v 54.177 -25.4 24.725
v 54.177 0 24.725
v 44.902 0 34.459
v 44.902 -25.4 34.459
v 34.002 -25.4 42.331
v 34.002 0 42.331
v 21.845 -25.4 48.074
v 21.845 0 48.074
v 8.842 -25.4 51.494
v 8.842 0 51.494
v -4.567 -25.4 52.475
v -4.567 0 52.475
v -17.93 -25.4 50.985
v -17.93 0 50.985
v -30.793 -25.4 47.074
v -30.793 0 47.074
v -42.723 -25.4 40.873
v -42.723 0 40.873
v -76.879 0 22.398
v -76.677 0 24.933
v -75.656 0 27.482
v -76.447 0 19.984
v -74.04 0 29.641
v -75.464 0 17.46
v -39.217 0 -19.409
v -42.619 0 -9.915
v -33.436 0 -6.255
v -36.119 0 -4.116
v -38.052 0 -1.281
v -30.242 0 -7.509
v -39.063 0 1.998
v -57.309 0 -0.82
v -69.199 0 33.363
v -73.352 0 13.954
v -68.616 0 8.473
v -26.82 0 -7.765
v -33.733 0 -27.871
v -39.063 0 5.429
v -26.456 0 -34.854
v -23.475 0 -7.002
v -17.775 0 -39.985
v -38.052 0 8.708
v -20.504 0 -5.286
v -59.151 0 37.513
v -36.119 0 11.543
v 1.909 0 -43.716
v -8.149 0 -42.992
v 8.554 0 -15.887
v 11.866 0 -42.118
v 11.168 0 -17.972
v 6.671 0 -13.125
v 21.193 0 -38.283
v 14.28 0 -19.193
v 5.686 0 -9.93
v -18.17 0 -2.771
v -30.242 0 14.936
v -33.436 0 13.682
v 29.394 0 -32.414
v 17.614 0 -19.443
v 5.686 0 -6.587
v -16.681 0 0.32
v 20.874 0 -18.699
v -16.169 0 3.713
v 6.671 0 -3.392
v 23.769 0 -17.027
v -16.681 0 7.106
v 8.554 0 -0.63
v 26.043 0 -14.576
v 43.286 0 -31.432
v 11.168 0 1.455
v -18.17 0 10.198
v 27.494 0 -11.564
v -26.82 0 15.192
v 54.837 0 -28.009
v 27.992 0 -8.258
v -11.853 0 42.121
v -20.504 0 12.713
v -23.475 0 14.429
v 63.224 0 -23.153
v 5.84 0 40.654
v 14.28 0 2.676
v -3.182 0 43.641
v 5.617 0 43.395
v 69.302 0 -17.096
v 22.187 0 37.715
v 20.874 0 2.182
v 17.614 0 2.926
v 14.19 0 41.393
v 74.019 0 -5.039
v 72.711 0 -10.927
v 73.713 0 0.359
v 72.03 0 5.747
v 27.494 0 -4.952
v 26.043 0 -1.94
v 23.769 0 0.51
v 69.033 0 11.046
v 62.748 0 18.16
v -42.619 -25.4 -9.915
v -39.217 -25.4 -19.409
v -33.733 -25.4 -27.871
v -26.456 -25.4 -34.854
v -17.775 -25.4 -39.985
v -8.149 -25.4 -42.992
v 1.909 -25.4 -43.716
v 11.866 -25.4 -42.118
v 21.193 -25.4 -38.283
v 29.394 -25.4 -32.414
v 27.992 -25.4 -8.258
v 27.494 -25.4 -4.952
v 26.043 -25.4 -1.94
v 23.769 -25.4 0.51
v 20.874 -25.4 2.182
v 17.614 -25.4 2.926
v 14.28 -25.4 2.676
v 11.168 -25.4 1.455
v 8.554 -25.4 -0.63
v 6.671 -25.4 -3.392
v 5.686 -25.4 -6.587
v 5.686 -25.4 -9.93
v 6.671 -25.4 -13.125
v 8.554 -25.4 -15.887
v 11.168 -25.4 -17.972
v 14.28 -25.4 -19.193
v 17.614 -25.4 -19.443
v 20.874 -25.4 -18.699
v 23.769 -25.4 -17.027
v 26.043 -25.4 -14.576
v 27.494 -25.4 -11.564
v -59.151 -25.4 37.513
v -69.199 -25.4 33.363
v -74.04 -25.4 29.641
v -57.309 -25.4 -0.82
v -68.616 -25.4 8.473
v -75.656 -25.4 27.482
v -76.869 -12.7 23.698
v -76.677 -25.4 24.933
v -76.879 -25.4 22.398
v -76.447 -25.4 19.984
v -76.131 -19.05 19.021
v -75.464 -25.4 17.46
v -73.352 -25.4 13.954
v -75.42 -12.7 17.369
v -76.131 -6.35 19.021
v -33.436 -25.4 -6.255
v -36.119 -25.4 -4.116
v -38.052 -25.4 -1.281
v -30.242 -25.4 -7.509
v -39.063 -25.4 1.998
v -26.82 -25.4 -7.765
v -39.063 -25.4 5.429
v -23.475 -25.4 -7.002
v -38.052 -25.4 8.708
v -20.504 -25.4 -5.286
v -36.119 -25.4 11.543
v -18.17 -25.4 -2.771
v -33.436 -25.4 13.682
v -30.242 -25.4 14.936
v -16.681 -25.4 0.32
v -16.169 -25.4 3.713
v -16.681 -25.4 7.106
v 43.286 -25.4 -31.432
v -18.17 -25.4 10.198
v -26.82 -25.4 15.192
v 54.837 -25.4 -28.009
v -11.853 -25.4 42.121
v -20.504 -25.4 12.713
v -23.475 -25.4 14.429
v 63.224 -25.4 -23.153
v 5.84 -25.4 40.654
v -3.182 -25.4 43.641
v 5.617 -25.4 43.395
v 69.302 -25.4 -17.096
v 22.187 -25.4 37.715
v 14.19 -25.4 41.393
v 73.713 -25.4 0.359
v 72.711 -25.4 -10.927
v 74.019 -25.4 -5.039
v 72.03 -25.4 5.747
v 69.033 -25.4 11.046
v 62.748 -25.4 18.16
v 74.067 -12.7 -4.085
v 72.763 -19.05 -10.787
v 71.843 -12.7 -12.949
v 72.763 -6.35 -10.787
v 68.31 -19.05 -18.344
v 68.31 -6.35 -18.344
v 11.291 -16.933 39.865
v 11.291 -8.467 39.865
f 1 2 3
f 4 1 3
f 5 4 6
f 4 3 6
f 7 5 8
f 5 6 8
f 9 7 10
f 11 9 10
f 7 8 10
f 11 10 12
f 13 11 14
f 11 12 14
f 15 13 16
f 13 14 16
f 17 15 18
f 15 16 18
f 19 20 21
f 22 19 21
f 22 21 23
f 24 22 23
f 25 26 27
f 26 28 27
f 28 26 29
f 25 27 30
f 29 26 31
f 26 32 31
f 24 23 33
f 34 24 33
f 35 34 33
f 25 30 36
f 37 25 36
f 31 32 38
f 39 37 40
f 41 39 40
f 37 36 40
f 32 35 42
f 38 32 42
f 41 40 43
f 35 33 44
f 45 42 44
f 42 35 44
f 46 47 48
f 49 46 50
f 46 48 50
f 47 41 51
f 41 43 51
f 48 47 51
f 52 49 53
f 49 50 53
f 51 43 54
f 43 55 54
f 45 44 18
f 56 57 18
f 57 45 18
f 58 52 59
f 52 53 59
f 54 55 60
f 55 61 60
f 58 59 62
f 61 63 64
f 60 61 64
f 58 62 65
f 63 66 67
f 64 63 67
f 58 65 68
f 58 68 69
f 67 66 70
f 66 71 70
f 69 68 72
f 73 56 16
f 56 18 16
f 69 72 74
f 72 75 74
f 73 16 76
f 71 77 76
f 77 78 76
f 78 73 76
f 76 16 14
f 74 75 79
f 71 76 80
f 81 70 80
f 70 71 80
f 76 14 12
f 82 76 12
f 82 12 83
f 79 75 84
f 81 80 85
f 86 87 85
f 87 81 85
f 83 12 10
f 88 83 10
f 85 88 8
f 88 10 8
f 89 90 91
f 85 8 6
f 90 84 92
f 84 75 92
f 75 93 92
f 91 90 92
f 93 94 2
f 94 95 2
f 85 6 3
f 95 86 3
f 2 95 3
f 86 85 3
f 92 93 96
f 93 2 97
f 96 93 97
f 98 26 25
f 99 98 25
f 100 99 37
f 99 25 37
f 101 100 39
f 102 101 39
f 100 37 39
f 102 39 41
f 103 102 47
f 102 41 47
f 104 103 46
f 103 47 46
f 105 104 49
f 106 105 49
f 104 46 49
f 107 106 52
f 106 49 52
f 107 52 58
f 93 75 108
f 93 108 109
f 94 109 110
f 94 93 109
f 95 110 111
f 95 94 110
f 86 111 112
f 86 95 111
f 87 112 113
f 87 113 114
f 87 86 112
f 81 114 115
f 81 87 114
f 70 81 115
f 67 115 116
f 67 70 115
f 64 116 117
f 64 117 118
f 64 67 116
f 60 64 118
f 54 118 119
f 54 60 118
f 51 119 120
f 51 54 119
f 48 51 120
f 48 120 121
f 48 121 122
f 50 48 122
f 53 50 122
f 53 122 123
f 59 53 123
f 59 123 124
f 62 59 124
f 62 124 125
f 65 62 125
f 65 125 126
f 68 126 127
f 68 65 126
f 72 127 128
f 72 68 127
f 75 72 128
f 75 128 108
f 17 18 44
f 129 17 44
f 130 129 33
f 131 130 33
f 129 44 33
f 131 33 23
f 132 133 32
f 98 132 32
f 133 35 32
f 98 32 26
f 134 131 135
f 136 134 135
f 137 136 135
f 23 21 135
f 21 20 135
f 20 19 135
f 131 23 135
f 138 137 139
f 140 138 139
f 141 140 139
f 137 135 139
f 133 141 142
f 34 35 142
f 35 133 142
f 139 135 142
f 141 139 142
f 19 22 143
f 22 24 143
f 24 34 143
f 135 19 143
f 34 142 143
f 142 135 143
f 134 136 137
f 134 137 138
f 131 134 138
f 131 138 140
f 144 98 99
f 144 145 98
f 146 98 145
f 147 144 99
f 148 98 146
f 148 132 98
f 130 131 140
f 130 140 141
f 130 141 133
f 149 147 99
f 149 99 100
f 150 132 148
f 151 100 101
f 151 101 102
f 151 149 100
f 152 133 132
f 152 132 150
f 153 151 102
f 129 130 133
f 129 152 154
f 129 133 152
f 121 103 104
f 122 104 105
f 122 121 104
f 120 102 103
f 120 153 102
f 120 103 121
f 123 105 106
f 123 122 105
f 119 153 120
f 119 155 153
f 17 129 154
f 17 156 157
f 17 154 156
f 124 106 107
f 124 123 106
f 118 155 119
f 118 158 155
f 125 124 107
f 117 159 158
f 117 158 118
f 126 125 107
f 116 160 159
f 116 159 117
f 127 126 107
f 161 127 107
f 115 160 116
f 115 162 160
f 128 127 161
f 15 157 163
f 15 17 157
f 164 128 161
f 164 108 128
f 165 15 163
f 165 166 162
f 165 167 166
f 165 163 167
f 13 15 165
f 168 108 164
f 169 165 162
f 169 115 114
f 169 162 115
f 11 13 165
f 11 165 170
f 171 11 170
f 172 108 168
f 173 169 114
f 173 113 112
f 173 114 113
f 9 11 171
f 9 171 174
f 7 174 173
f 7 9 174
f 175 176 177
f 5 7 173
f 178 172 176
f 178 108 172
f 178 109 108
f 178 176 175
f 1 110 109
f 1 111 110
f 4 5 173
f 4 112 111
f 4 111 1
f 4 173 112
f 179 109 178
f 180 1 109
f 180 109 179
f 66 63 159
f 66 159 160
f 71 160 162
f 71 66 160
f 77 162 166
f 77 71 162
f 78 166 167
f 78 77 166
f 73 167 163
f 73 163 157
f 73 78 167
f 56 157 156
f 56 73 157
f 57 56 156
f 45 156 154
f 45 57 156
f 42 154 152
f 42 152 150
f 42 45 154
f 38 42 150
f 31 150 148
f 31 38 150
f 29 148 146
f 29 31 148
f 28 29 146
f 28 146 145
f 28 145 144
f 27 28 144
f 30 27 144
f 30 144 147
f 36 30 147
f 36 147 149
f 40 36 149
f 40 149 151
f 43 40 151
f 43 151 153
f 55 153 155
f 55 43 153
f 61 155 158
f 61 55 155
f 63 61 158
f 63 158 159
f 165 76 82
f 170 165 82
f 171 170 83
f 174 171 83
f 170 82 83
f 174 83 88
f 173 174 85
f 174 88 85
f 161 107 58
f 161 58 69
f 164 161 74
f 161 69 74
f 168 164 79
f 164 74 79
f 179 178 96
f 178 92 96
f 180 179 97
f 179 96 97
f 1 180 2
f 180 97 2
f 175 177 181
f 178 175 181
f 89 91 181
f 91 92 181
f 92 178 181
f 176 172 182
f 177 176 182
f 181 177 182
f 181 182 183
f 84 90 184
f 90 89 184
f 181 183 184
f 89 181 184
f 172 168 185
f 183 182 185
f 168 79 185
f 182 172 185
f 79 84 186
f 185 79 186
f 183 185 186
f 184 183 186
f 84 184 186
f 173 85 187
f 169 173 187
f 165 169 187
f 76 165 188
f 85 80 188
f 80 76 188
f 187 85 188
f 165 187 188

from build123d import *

# Parameters (mm, degrees)
F0_R     = 11.5110265847
F0_R_2   = 11.2157876958
F1_DEPTH = 25.4
F2_DEPTH = 25.4


with BuildPart() as f1:
    # F0 (on Front) → F1 (new body)
    with BuildSketch(Plane.XZ):
        with BuildLine():
            add(Edge.make_bspline(
                [(-42.6191106401, -9.9153485832), (-20.6350689987, -21.9972569119), (7.738026744, -31.8239785263), (29.3943516136, -32.4141145567)],
                knots=[0.8430854965, 0.8430854965, 0.8430854965, 0.8430854965, 1, 1, 1, 1], degree=3))
            ThreePointArc((29.3943516136, -32.4141145567), (40.0057537744, -17.7268833761), (43.7573162944, 0))
            ThreePointArc((43.7573162944, 0), (37.9839654581, 21.7237450123), (22.1873875452, 37.715017741))
            add(Edge.make_bspline(
                [(22.1873875452, 37.715017741), (11.6721202081, 40.2099582819), (-0.1429108616, 41.6665900381), (-11.8526616126, 42.1214570259)],
                knots=[0.4240545667, 0.4240545667, 0.4240545667, 0.4240545667, 0.4970480989, 0.4970480989, 0.4970480989, 0.4970480989], degree=3))
            ThreePointArc((-11.8526616126, 42.1214570259), (-37.6663082553, 22.2699787089), (-42.6191106402, -9.9153485832))
        make_face()
        with Locations((-27.6805255562, 3.7134094164)):
            Circle(F0_R, mode=Mode.SUBTRACT)
        with Locations((16.7762394994, -8.2583986223)):
            Circle(F0_R_2, mode=Mode.SUBTRACT)
        with BuildLine():
            add(Edge.make_bspline(
                [(-42.7234657978, 40.8730333774), (-61.8148502648, 38.3753901199), (-91.4828084934, 26.3670705011), (-62.8281013178, 1.1910337993), (-42.6191106401, -9.9153485832)],
                knots=[0.5639979758, 0.5639979758, 0.5639979758, 0.5639979758, 0.6988406943, 0.8430854965, 0.8430854965, 0.8430854965, 0.8430854965], degree=3))
            ThreePointArc((-42.6191106402, -9.9153485832), (-37.6663082553, 22.2699787089), (-11.8526616126, 42.1214570259))
            add(Edge.make_bspline(
                [(-11.8526616126, 42.1214570259), (-22.5928785611, 42.5386623307), (-33.2445272732, 42.1131219072), (-42.7234657978, 40.8730333774)],
                knots=[0.4970480989, 0.4970480989, 0.4970480989, 0.4970480989, 0.5639979758, 0.5639979758, 0.5639979758, 0.5639979758], degree=3))
        make_face()
        with BuildLine():
            ThreePointArc((43.7573162944, 0), (40.0057537744, -17.7268833761), (29.3943516136, -32.4141145567))
            add(Edge.make_bspline(
                [(29.3943516136, -32.4141145567), (56.9711731435, -33.1655844432), (84.9977641322, -9.2707192189), (67.106763708, 16.3997179852), (54.1769252073, 24.7250533856)],
                knots=[0, 0, 0, 0, 0.1998124467, 0.3356238703, 0.3356238703, 0.3356238703, 0.3356238703], degree=3))
            add(Edge.make_bspline(
                [(54.1769252073, 24.7250533856), (45.7579380993, 30.1459170261), (34.9264945205, 34.6924303516), (22.1873875452, 37.715017741)],
                knots=[0.3356238703, 0.3356238703, 0.3356238703, 0.3356238703, 0.4240545667, 0.4240545667, 0.4240545667, 0.4240545667], degree=3))
            ThreePointArc((22.1873875452, 37.715017741), (37.9839654581, 21.7237450123), (43.7573162944, 0))
        make_face()
    extrude(amount=F1_DEPTH)

    # F0 (on Front) → F2 (join)
    with BuildSketch(Plane.XZ):
        with BuildLine():
            add(Edge.make_bspline(
                [(-42.6191106401, -9.9153485832), (-20.6350689987, -21.9972569119), (7.738026744, -31.8239785263), (29.3943516136, -32.4141145567)],
                knots=[0.8430854965, 0.8430854965, 0.8430854965, 0.8430854965, 1, 1, 1, 1], degree=3))
            ThreePointArc((29.3943516136, -32.4141145567), (40.0057537744, -17.7268833761), (43.7573162944, 0))
            ThreePointArc((43.7573162944, 0), (37.9839654581, 21.7237450123), (22.1873875452, 37.715017741))
            add(Edge.make_bspline(
                [(22.1873875452, 37.715017741), (11.6721202081, 40.2099582819), (-0.1429108616, 41.6665900381), (-11.8526616126, 42.1214570259)],
                knots=[0.4240545667, 0.4240545667, 0.4240545667, 0.4240545667, 0.4970480989, 0.4970480989, 0.4970480989, 0.4970480989], degree=3))
            ThreePointArc((-11.8526616126, 42.1214570259), (-37.6663082553, 22.2699787089), (-42.6191106402, -9.9153485832))
        make_face()
        with Locations((-27.6805255562, 3.7134094164)):
            Circle(F0_R, mode=Mode.SUBTRACT)
        with Locations((16.7762394994, -8.2583986223)):
            Circle(F0_R_2, mode=Mode.SUBTRACT)
        with BuildLine():
            ThreePointArc((43.7573162944, 0), (40.0057537744, -17.7268833761), (29.3943516136, -32.4141145567))
            add(Edge.make_bspline(
                [(29.3943516136, -32.4141145567), (56.9711731435, -33.1655844432), (84.9977641322, -9.2707192189), (67.106763708, 16.3997179852), (54.1769252073, 24.7250533856)],
                knots=[0, 0, 0, 0, 0.1998124467, 0.3356238703, 0.3356238703, 0.3356238703, 0.3356238703], degree=3))
            add(Edge.make_bspline(
                [(54.1769252073, 24.7250533856), (45.7579380993, 30.1459170261), (34.9264945205, 34.6924303516), (22.1873875452, 37.715017741)],
                knots=[0.3356238703, 0.3356238703, 0.3356238703, 0.3356238703, 0.4240545667, 0.4240545667, 0.4240545667, 0.4240545667], degree=3))
            ThreePointArc((22.1873875452, 37.715017741), (37.9839654581, 21.7237450123), (43.7573162944, 0))
        make_face()
        with BuildLine():
            ThreePointArc((-42.6191106402, -9.9153485832), (-13.0488382782, -41.7663806054), (29.3943516136, -32.4141145567))
            add(Edge.make_bspline(
                [(-42.6191106401, -9.9153485832), (-20.6350689987, -21.9972569119), (7.738026744, -31.8239785263), (29.3943516136, -32.4141145567)],
                knots=[0.8430854965, 0.8430854965, 0.8430854965, 0.8430854965, 1, 1, 1, 1], degree=3))
        make_face()
        with BuildLine():
            add(Edge.make_bspline(
                [(-42.7234657978, 40.8730333774), (-61.8148502648, 38.3753901199), (-91.4828084934, 26.3670705011), (-62.8281013178, 1.1910337993), (-42.6191106401, -9.9153485832)],
                knots=[0.5639979758, 0.5639979758, 0.5639979758, 0.5639979758, 0.6988406943, 0.8430854965, 0.8430854965, 0.8430854965, 0.8430854965], degree=3))
            ThreePointArc((-42.6191106402, -9.9153485832), (-37.6663082553, 22.2699787089), (-11.8526616126, 42.1214570259))
            add(Edge.make_bspline(
                [(-11.8526616126, 42.1214570259), (-22.5928785611, 42.5386623307), (-33.2445272732, 42.1131219072), (-42.7234657978, 40.8730333774)],
                knots=[0.4970480989, 0.4970480989, 0.4970480989, 0.4970480989, 0.5639979758, 0.5639979758, 0.5639979758, 0.5639979758], degree=3))
        make_face()
        with BuildLine():
            add(Edge.make_bspline(
                [(54.1769252073, 24.7250533856), (45.7579380993, 30.1459170261), (34.9264945205, 34.6924303516), (22.1873875452, 37.715017741)],
                knots=[0.3356238703, 0.3356238703, 0.3356238703, 0.3356238703, 0.4240545667, 0.4240545667, 0.4240545667, 0.4240545667], degree=3))
            ThreePointArc((54.1769252073, 24.7250533856), (8.8421199016, 51.4937982895), (-42.7234657978, 40.8730333774))
            add(Edge.make_bspline(
                [(-11.8526616126, 42.1214570259), (-22.5928785611, 42.5386623307), (-33.2445272732, 42.1131219072), (-42.7234657978, 40.8730333774)],
                knots=[0.4970480989, 0.4970480989, 0.4970480989, 0.4970480989, 0.5639979758, 0.5639979758, 0.5639979758, 0.5639979758], degree=3))
            ThreePointArc((-11.8526616126, 42.1214570259), (5.6174564367, 43.3952406661), (22.1873875452, 37.715017741))
        make_face()
    extrude(amount=F2_DEPTH)


solid = f1.part
